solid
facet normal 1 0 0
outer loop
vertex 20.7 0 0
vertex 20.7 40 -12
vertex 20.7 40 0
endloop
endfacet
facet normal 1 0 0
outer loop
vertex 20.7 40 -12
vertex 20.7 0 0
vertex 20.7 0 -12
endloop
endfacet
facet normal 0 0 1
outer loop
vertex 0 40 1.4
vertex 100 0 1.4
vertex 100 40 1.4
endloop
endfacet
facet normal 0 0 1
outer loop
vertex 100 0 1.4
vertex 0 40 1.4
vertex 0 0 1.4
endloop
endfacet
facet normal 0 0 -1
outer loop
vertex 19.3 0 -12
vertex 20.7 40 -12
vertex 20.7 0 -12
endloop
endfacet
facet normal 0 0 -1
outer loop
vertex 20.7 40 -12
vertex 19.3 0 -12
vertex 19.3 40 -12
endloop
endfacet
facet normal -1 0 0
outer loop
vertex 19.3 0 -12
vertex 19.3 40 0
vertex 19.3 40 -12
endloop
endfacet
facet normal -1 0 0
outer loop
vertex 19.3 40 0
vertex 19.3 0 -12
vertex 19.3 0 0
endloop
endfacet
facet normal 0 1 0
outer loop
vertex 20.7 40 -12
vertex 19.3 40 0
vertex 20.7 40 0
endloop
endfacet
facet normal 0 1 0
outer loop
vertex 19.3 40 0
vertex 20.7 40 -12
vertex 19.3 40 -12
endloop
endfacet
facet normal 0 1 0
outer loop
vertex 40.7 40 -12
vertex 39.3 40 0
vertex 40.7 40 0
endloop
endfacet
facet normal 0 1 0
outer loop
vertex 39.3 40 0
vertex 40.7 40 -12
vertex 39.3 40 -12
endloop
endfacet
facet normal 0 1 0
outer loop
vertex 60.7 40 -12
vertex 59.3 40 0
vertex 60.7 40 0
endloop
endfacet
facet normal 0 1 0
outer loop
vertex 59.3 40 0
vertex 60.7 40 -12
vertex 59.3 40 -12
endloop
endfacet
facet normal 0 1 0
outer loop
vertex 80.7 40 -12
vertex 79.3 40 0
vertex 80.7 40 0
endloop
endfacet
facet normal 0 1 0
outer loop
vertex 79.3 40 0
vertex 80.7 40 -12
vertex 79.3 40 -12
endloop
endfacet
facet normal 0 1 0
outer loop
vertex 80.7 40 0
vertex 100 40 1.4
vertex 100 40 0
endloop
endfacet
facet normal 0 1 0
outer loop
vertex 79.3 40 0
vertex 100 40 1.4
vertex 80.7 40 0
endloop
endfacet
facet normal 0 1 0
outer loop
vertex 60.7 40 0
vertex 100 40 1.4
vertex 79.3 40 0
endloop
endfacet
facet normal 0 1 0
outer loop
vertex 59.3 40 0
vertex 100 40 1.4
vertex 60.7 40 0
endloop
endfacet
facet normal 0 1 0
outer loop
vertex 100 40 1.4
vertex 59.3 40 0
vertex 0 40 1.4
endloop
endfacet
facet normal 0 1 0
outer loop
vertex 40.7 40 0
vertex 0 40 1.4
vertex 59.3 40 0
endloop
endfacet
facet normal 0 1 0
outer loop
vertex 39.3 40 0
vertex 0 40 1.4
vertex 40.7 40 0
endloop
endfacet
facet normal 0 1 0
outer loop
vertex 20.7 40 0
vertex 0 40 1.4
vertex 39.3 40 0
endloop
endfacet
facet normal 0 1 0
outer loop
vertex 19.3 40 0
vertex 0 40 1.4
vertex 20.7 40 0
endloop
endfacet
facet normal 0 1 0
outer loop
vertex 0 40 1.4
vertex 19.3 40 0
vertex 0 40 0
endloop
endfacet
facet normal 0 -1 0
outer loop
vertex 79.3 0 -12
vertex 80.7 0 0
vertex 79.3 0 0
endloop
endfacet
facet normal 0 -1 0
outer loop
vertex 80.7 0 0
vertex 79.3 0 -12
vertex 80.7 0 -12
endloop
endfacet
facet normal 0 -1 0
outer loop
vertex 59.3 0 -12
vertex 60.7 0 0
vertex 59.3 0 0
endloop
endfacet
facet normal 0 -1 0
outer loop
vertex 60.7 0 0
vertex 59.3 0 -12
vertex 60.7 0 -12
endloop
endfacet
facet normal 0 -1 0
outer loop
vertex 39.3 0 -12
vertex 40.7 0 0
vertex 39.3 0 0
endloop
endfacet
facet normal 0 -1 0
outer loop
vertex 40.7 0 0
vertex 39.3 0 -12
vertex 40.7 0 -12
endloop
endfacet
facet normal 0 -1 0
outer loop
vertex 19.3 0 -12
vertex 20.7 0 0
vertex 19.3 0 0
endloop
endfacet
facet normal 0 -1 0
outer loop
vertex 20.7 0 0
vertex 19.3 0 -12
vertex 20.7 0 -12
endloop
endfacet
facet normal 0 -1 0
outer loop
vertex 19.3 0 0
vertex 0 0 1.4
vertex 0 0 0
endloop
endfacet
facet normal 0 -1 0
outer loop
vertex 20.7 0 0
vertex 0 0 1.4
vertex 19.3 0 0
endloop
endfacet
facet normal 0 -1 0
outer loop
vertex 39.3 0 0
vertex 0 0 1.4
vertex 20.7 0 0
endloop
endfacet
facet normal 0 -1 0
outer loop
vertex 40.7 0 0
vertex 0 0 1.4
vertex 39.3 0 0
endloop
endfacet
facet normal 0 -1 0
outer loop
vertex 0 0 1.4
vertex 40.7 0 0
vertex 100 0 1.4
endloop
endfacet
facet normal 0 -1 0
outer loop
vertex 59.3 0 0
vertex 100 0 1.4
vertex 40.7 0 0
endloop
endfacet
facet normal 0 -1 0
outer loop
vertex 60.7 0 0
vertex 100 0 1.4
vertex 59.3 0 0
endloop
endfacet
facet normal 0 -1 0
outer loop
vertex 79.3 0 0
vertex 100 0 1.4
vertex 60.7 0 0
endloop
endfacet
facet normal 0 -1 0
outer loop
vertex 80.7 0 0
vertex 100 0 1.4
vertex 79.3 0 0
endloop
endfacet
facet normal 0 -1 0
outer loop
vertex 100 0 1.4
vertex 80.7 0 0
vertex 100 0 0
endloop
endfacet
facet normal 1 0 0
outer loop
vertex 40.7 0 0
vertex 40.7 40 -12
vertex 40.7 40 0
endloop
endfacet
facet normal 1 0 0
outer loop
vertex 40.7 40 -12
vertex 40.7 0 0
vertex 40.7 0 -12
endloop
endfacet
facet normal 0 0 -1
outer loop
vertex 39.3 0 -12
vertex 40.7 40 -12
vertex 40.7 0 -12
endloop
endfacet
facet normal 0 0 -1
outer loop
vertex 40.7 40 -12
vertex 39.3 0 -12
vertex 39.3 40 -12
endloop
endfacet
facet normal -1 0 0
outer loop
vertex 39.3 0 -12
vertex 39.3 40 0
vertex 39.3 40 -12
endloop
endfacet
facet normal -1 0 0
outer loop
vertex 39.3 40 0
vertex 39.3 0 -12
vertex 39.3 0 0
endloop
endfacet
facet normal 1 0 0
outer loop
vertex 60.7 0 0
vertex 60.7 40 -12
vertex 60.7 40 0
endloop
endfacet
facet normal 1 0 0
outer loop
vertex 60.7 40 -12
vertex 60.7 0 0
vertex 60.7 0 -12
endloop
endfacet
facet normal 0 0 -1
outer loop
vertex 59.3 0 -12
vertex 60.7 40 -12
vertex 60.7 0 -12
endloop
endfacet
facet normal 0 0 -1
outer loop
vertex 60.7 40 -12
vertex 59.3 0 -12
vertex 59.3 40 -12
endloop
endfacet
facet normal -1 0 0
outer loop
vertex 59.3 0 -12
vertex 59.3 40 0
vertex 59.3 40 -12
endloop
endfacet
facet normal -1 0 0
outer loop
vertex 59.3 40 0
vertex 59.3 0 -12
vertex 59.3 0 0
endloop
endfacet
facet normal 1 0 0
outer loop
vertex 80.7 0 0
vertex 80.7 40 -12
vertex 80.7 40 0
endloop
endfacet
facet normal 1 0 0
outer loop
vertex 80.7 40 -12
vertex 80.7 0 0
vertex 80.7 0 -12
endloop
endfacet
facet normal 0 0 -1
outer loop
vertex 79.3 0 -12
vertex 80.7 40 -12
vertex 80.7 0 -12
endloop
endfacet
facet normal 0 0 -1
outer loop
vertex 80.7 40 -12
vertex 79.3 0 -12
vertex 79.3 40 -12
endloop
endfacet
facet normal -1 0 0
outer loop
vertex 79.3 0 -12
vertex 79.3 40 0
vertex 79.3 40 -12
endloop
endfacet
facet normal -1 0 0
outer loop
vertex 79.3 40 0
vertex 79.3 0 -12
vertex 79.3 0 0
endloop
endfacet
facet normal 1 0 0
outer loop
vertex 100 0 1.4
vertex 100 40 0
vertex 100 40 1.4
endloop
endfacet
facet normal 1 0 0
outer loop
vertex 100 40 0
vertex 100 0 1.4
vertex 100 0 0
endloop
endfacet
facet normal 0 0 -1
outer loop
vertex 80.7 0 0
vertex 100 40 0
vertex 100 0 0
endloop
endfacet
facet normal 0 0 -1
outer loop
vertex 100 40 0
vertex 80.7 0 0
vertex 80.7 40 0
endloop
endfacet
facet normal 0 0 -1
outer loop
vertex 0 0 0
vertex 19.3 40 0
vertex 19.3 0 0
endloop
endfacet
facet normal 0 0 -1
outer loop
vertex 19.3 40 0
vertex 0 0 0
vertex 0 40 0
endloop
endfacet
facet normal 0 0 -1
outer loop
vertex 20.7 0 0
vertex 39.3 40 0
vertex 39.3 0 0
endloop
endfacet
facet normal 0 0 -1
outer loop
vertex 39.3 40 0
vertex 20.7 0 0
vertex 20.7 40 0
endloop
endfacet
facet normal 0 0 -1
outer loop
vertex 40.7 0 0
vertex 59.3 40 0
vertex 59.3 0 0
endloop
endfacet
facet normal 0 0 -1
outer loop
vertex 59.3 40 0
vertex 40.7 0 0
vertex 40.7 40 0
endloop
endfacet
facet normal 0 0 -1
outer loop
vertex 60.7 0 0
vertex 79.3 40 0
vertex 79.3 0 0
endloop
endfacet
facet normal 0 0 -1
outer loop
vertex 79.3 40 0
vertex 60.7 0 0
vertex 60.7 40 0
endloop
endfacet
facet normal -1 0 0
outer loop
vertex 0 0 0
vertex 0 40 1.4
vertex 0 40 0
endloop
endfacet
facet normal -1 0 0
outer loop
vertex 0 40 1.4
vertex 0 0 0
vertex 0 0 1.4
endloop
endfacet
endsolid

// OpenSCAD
$fn = 32;

// ----------------------------------------------------------------------
// Ribbed panel: 1.4 mm panel
// ----------------------------------------------------------------------

// --- parameters (mm) ---
panel_l = 100;            // panel length, X
panel_w = 40;             // panel width, Y
panel_t = 1.4;            // panel thickness, Z
rib_t = 1.4;              // rib thickness
rib_h = 12;               // rib height below the panel
ribs = 4;                 // number of ribs

total_h = panel_t + rib_h;  // overall height

union() {
  cube([panel_l, panel_w, panel_t]);
  for (i = [1 : ribs])
    translate([i * panel_l / (ribs + 1) - rib_t / 2, 0, -rib_h])
      cube([rib_t, panel_w, rib_h + panel_t]);
}
